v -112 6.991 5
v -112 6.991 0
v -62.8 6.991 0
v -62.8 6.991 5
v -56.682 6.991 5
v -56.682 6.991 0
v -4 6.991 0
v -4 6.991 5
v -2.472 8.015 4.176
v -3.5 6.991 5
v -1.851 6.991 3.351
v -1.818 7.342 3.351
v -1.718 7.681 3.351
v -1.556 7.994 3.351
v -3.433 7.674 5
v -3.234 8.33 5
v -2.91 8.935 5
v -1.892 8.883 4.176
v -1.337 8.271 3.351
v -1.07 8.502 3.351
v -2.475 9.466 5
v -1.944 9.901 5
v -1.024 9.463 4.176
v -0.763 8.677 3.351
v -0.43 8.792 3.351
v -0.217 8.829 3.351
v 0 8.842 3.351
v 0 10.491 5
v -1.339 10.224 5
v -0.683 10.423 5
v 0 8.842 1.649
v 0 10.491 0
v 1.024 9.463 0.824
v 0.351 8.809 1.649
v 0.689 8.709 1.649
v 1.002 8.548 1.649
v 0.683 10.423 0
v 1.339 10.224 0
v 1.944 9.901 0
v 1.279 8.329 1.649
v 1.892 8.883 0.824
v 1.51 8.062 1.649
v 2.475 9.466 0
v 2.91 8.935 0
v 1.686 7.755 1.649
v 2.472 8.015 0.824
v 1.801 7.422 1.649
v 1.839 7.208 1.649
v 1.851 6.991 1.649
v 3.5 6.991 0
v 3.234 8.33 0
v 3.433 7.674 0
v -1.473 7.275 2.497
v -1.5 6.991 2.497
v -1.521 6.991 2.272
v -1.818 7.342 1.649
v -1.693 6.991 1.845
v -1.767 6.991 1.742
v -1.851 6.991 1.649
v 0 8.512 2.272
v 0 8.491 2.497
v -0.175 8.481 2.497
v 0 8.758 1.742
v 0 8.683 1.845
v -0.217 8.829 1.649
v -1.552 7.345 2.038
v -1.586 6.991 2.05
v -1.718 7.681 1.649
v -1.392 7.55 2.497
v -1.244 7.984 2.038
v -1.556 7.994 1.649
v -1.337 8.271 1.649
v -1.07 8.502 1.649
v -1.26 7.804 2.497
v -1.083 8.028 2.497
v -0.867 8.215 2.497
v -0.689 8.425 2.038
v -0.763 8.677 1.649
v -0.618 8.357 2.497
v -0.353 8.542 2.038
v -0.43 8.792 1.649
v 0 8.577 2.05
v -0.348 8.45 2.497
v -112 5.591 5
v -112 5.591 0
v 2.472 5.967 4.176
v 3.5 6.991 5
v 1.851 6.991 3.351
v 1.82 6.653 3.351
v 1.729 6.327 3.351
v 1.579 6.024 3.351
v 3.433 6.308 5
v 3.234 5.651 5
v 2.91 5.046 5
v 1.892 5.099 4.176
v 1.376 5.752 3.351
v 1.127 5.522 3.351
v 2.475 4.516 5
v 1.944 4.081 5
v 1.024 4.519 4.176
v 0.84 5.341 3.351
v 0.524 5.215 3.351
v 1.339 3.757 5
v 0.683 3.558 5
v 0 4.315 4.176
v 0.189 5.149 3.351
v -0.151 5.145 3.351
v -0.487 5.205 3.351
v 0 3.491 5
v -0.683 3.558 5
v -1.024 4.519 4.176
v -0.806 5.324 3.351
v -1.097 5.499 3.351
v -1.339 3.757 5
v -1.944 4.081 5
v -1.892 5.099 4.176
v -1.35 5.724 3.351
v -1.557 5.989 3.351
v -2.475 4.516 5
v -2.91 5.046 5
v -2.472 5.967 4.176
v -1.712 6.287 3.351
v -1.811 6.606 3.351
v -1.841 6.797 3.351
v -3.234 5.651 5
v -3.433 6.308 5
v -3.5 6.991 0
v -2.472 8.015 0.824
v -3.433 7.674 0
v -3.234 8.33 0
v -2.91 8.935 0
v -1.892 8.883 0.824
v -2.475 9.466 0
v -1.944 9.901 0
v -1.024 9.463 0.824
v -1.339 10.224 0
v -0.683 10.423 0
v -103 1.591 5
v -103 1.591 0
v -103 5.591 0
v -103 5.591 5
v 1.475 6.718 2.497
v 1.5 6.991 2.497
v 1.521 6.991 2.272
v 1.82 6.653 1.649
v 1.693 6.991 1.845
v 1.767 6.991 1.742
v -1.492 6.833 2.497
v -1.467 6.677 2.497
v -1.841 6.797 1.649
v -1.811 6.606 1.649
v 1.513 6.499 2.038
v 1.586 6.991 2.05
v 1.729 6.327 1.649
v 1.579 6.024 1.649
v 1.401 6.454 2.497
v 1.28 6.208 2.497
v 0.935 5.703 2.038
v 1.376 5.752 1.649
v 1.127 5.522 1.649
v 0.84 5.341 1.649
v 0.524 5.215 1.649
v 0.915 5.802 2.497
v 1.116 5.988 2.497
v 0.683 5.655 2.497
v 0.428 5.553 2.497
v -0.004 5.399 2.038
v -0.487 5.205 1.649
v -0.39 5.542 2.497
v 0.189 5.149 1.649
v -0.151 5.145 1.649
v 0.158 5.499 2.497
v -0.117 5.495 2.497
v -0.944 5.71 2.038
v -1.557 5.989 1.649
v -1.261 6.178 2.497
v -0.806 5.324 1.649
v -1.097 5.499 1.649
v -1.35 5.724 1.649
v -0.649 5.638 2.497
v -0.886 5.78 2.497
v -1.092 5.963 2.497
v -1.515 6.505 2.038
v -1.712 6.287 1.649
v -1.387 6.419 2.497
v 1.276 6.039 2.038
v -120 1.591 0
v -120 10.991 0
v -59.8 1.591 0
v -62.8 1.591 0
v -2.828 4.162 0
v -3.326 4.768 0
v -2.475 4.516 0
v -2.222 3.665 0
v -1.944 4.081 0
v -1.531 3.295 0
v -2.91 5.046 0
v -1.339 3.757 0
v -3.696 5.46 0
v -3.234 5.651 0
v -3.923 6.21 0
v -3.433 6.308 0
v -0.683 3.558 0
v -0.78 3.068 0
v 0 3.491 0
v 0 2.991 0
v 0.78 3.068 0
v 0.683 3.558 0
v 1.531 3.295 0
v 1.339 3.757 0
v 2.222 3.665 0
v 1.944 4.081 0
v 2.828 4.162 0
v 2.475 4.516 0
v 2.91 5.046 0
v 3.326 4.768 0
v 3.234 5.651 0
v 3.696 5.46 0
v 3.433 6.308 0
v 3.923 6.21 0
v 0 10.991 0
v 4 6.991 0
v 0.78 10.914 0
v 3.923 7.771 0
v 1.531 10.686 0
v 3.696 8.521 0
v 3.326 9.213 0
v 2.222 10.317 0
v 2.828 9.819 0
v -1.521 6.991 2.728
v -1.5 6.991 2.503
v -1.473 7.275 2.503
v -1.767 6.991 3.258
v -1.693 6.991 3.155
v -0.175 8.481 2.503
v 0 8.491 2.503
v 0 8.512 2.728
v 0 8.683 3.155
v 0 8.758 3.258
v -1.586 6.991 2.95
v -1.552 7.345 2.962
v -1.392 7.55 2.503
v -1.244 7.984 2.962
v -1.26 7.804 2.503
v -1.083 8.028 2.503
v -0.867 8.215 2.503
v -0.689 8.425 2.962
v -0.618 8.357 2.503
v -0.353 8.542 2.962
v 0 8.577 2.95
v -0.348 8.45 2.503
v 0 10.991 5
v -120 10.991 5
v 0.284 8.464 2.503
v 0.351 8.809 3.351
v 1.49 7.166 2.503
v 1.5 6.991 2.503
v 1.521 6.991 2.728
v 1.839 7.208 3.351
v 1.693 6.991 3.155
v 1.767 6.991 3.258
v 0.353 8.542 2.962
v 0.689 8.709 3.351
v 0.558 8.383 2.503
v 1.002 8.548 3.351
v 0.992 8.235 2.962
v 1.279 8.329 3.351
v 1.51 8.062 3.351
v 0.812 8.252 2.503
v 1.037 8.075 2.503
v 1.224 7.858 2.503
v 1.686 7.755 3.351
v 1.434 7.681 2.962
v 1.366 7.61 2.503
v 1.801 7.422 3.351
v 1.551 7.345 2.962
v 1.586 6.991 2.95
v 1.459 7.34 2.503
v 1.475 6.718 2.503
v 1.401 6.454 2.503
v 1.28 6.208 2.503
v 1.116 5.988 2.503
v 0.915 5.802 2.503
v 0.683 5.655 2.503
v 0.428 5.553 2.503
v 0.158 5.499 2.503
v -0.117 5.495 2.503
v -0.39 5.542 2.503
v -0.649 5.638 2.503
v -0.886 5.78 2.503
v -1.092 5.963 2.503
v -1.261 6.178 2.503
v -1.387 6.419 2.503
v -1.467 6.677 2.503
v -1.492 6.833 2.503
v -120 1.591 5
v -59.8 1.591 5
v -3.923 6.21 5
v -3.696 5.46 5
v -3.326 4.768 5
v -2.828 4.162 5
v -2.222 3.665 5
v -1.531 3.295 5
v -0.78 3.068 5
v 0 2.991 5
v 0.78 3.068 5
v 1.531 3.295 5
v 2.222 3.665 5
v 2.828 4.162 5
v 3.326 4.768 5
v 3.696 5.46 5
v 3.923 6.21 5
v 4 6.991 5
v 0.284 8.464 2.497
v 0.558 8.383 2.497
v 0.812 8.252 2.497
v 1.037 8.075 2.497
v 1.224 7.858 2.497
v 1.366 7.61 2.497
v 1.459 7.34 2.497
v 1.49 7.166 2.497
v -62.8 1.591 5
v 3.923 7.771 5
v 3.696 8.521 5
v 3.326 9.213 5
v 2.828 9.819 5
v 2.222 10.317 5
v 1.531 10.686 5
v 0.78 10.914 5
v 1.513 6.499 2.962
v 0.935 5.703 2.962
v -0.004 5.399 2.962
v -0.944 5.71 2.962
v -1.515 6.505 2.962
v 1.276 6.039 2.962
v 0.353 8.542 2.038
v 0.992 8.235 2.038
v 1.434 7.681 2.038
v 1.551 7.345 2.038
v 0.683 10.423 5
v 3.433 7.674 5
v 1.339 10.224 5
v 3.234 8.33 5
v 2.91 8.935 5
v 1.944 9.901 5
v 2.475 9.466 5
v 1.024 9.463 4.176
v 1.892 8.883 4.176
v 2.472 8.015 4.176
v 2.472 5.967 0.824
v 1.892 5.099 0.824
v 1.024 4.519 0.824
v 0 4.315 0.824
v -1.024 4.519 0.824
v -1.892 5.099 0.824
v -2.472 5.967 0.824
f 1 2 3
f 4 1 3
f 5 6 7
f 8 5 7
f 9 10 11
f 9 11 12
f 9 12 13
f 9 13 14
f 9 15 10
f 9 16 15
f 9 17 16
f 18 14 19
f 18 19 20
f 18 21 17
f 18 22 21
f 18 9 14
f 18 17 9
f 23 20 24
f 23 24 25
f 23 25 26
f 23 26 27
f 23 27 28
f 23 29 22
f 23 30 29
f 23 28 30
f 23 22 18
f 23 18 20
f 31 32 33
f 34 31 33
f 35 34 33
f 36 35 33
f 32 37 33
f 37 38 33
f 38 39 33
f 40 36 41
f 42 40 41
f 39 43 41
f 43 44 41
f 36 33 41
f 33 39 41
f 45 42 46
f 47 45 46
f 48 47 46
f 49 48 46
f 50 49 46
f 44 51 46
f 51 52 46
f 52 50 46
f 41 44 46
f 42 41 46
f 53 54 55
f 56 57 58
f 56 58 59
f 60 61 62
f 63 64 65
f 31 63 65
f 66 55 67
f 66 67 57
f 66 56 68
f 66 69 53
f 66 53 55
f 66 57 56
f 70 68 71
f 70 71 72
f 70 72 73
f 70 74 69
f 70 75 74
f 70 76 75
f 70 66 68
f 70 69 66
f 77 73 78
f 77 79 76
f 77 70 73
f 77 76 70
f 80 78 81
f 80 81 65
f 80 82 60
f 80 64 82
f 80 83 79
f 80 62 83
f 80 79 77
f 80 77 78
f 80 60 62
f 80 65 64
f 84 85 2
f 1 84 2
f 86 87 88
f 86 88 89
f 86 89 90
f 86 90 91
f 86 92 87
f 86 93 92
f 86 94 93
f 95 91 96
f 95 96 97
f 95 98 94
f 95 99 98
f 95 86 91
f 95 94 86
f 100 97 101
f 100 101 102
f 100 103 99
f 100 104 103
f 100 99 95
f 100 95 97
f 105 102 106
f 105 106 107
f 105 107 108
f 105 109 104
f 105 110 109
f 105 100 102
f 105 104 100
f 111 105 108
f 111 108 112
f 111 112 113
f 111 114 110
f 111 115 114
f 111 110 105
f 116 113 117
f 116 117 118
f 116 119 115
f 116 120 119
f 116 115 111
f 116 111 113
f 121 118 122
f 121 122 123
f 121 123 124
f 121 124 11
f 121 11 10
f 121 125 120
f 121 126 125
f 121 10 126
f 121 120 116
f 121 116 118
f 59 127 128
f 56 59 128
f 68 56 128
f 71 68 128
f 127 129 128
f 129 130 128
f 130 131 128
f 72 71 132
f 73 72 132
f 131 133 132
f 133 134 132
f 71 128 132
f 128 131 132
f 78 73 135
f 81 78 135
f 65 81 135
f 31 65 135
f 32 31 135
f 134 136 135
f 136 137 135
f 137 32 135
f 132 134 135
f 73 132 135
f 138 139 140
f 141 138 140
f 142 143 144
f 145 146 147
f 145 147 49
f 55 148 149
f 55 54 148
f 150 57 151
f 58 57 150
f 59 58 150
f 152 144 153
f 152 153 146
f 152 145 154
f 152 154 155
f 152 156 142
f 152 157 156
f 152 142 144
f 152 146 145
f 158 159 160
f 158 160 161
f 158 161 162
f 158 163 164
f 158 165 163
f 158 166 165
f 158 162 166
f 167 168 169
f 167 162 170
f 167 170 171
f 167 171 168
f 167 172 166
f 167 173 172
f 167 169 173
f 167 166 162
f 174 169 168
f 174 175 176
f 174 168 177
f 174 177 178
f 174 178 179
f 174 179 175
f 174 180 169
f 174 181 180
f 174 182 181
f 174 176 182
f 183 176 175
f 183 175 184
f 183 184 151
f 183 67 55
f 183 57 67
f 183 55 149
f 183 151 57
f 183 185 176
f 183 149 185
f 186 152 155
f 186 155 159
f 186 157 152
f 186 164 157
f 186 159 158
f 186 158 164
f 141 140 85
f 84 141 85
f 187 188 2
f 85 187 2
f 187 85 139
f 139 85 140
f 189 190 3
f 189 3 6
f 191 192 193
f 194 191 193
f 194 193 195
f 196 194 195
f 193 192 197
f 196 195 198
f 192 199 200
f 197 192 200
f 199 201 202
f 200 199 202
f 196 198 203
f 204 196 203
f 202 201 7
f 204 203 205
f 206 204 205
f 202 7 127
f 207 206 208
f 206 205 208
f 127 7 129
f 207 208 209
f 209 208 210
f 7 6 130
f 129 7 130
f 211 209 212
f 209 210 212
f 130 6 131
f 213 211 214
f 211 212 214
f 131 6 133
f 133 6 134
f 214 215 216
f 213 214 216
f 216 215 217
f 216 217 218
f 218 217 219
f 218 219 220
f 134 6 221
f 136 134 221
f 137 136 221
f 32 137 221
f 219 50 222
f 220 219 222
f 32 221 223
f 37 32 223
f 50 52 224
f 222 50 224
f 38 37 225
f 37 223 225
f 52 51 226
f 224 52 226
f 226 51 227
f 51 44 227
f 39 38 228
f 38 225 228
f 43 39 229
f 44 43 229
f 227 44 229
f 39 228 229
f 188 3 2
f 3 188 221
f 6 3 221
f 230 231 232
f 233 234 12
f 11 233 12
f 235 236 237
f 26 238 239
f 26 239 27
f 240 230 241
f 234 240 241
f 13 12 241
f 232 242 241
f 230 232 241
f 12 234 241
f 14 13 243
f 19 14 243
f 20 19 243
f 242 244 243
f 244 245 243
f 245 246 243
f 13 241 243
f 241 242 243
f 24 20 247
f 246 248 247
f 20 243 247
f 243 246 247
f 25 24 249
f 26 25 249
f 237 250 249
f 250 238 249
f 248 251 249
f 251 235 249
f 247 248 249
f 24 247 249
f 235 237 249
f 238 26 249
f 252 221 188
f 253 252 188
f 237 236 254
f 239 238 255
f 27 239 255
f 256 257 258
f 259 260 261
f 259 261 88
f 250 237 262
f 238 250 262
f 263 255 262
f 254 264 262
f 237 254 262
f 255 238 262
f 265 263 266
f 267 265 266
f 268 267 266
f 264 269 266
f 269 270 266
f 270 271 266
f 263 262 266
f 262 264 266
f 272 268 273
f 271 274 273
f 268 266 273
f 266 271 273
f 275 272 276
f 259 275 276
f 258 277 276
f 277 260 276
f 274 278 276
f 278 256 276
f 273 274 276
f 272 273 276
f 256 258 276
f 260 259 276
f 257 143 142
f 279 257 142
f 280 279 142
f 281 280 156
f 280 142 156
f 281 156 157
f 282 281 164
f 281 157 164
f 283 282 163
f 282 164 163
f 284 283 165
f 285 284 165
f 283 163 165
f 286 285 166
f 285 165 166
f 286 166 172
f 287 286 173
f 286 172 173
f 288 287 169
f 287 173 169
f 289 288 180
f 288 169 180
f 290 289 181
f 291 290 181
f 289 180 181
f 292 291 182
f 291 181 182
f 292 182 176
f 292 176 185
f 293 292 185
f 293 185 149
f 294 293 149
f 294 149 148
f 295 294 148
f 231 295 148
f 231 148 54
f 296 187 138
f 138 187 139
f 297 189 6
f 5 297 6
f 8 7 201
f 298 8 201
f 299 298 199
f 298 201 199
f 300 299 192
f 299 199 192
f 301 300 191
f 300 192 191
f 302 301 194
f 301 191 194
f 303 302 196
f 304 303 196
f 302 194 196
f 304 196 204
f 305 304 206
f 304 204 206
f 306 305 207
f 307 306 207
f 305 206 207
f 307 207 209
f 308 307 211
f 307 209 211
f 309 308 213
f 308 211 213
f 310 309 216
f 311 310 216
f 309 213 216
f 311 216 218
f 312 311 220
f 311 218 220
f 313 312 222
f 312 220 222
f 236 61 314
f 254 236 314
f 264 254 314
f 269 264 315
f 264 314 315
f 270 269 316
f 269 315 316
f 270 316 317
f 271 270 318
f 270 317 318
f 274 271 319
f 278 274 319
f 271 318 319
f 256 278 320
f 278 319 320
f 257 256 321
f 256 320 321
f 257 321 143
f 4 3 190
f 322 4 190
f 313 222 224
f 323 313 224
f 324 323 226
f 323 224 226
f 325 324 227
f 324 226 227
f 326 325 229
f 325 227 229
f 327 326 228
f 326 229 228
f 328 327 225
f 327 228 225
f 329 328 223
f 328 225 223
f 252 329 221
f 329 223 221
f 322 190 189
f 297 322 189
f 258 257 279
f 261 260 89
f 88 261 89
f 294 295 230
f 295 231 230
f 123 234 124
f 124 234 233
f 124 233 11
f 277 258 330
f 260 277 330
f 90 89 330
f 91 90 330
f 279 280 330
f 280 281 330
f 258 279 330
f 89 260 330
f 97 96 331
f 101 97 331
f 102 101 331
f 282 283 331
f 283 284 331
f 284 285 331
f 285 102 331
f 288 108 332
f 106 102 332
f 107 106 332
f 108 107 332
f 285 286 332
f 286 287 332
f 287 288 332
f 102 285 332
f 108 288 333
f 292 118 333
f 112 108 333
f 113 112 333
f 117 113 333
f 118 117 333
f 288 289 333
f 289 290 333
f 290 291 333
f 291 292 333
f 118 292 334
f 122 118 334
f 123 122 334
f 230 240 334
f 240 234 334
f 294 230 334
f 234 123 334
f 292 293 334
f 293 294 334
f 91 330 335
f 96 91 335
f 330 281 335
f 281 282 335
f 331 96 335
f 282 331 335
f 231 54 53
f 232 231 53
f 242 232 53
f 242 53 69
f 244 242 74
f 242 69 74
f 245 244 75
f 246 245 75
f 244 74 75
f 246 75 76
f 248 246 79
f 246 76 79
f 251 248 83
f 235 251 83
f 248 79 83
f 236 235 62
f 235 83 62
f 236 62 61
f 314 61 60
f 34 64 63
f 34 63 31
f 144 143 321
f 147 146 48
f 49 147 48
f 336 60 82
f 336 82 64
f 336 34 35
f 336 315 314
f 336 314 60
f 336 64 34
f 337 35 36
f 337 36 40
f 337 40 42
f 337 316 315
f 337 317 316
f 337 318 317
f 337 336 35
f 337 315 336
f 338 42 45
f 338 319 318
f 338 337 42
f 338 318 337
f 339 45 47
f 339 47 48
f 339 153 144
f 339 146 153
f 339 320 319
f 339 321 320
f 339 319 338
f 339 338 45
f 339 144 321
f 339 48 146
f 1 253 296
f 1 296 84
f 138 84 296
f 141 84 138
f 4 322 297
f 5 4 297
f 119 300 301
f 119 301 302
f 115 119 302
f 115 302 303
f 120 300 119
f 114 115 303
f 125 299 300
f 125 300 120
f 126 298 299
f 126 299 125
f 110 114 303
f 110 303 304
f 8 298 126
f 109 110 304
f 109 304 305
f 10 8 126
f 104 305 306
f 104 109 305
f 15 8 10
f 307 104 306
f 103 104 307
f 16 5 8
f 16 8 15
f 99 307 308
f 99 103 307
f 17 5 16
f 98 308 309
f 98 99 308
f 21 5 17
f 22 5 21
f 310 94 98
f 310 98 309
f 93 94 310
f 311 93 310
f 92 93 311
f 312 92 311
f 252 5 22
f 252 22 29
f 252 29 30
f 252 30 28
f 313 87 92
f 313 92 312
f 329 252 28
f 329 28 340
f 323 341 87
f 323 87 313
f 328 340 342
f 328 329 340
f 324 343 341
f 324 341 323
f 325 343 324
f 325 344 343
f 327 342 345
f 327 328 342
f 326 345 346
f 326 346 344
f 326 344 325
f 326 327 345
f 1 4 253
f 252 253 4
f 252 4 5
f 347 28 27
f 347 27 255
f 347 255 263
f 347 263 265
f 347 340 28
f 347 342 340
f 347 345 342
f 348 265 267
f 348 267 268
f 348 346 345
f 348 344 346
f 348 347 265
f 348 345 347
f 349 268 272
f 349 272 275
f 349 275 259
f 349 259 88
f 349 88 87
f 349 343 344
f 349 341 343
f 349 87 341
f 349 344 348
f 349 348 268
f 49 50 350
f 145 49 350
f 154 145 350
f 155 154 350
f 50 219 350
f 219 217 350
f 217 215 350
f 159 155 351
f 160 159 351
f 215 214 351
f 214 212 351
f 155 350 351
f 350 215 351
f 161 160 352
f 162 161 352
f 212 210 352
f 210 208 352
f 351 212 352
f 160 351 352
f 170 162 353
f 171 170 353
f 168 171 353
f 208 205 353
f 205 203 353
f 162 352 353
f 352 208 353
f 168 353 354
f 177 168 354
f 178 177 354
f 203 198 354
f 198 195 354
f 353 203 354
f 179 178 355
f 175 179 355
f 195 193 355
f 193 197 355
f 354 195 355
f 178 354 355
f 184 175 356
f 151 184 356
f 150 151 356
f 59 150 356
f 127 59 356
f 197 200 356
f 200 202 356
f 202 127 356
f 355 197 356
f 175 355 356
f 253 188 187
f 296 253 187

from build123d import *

# Parameters (mm, degrees)
F1_DEPTH = 5
F2_SIZE  = 2
F3_R     = 1.2


with BuildPart() as f1:
    # F0 (on Top) → F1 (new body)
    with BuildSketch(Plane.XY):
        with BuildLine():
            Line((-120, 1.5907304411), (-103, 1.5907304411))
            Line((-103, 1.5907304411), (-103, 5.5907304411))
            Line((-103, 5.5907304411), (-112, 5.5907304411))
            Line((-112, 5.5907304411), (-112, 6.9907304411))
            Line((-112, 6.9907304411), (-62.8, 6.9907304411))
            Line((-62.8, 6.9907304411), (-62.8, 1.5907304411))
            Line((-62.8, 1.5907304411), (-59.8, 1.5907304411))
            Line((-59.8, 1.5907304411), (-56.6823085464, 6.9907304411))
            Line((-56.6823085464, 6.9907304411), (-4, 6.9907304411))
            ThreePointArc((-4, 6.9907304411), (-2.8284271247, 9.8191575658), (0, 10.9907304411))
            Line((0, 10.9907304411), (-120, 10.9907304411))
            Line((-120, 10.9907304411), (-120, 1.5907304411))
        make_face()
        with BuildLine():
            ThreePointArc((4, 6.9907304411), (2.8284271247, 9.8191575658), (0, 10.9907304411))
            Line((0, 10.9907304411), (0, 8.4907304411))
            ThreePointArc((0, 8.4907304411), (1.0606601718, 8.0513906128), (1.5, 6.9907304411))
            ThreePointArc((1.5, 6.9907304411), (0, 5.4907304411), (-1.5, 6.9907304411))
            Line((-1.5, 6.9907304411), (-4, 6.9907304411))
            ThreePointArc((-4, 6.9907304411), (0, 2.9907304411), (4, 6.9907304411))
        make_face()
        with BuildLine():
            Line((0, 8.4907304411), (0, 10.9907304411))
            ThreePointArc((0, 10.9907304411), (-2.8284271247, 9.8191575658), (-4, 6.9907304411))
            Line((-4, 6.9907304411), (-1.5, 6.9907304411))
            ThreePointArc((-1.5, 6.9907304411), (-1.0606601718, 8.0513906128), (0, 8.4907304411))
        make_face()
    extrude(amount=F1_DEPTH)

    # F2
    f2_edges = [f1.edges().sort_by_distance(p)[0] for p in [
        (0, 5.49073, 5),
        (0, 5.49073, 0),
    ]]
    chamfer(f2_edges, length=F2_SIZE)

    # F3
    f3_edges = [f1.edges().sort_by_distance(p)[0] for p in [
        (0, 8.49073, 2.5),
        (0, 5.49073, 2),
        (0, 5.49073, 3),
    ]]
    fillet(f3_edges, radius=F3_R)


solid = f1.part
